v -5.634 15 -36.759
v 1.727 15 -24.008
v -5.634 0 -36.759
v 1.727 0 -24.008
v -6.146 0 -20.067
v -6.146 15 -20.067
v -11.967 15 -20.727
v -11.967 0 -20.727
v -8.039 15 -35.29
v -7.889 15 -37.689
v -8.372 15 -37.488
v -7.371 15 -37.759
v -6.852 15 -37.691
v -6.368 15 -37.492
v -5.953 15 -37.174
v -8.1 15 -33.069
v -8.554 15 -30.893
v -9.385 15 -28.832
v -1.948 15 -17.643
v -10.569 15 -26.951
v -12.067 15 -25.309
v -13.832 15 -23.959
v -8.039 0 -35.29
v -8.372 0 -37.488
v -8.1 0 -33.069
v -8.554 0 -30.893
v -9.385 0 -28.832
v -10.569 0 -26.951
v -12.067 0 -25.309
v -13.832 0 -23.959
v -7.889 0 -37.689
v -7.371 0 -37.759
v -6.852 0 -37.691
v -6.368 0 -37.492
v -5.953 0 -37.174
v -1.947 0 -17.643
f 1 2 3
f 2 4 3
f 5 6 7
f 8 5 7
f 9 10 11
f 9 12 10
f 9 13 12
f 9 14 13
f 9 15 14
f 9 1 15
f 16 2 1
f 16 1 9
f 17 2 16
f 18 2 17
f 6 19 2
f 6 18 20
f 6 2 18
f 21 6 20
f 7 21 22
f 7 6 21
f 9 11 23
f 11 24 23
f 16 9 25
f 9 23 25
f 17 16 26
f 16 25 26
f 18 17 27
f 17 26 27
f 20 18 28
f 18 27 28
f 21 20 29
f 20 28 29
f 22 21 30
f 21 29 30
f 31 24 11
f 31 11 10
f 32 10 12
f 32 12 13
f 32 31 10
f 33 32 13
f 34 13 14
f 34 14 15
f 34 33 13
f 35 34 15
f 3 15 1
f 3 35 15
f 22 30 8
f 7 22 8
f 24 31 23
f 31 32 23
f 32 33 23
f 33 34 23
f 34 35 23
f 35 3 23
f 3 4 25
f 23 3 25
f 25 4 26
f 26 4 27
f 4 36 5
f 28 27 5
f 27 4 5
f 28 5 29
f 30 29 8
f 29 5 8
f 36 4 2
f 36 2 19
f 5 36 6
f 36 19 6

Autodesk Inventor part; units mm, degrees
ref_plane "YZ Plane" through (0, 0, 0) normal (1, 0, 0) x (0, 1, 0)
ref_plane "XZ Plane" through (0, 0, 0) normal (0, 1, 0) x (-1, 0, 0)
ref_plane "XY Plane" through (0, 0, 0) normal (0, 0, 1) x (1, 0, 0)
sketch "スケッチ2" plane through (0, 0, 0) normal (0, 1, 0) x (-1, 0, 0)
  line L0 (0, 0) -> (-8.6603, -15)
  line L1 (-8.6603, -15) -> (11.3397, -49.641)
  line L2 (73.7428, 0) -> (-22.3941, 0) projected
  line L3 (11.3397, -49.641) -> (5.9252, -52.7671) construction
  line L4 (0, 0) -> (-6.6711, 3.8516) construction
  line L5 (11.3397, -49.641) -> (24.3301, -42.141)
  line L6 (24.3301, -42.141) -> (0, 0)
  line L7 (0, 0) -> (8.2272, -4.75)
  line L8 (8.2272, -4.75) -> (-3.1754, -24.5)
  line L9 (-2.5935, -25.5079) -> (9.1002, -5.254)
  line L10 (9.1002, -5.254) -> (8.2272, -4.75)
  line L11 (-3.1754, -24.5) -> (2.5403, -27.8)
  line L12 (2.5403, -27.8) -> (12.2903, -10.9125)
  line L13 (12.2903, -10.9125) -> (6.5746, -7.6125)
  line L14 (6.5746, -7.6125) -> (-3.1754, -24.5)
  line L15 (11.3397, -49.641) -> (31.9282, -37.7543)
  line L16 (31.9282, -37.7543) -> (38.6416, -26.1264)
  line L17 (6.3397, -40.9808) -> (21.9282, -31.9808) construction
  line L18 (21.9282, -31.9808) -> (31.9282, -37.7543)
  line L19 (12.2903, -10.9125) -> (38.6416, -26.1264)
  line L20 (38.6416, -26.1264) -> (3.5066, -26.1264)
  line L21 (0, 0) -> (21.3397, 36.9615)
  line L22 (21.3397, 36.9615) -> (15.2136, 40.4985)
  line L23 (-0.5996, -1.0385) -> (60.009, -1.0385)
  circle A0 centre (21.3397, -13.5385) radius 12.5 construction
  circle A1 centre (21.3397, -13.5385) radius 10.5 construction
  circle A2 centre (20.5151, -34.5223) radius 10.5 construction
  circle A3 centre (20.5151, -34.5223) radius 11.5 construction
  circle A4 centre (20.5151, -34.5223) radius 12.5
  line L24 (8.3719, -37.4876) -> (11.3397, -49.641)
  line L25 (-2.3094, -23) -> (12.6388, -48.891)
  point P0 (9.2953, -16.1)
  point P1 (7.4475, -8.1165)
  point P2 (-2.3025, -25.004)
  point P3 (15.0841, -26.1264)
  point P4 (11.2545, -26.1264)
  point P5 (6.0668, -10.5079)
  point P6 (13.8325, -23.9586)
  point P7 (10.0702, -44.4421)
  point P8 (-1.7275, -24.0079)
  dimension "d34" = 25
  dimension "d11" = 60
  dimension "d12" = 60
  dimension "d13" = 40
  dimension "d15" = 15
  dimension "d16" = 9.5
  dimension "d17" = 1.0079
  dimension "d18" = 19.5
  dimension "d19" = 6.6
  dimension "d24" = 18
  dimension "d25" = 30
  dimension "d26" = 60
  dimension "d28" = 60
  dimension "d29" = 38
  dimension "d30" = 25
  dimension "d31" = 21
  dimension "d32" = 21
  dimension "d33" = 23
  dimension "d40" = 1.5
extrude "押し出し4" add sketch "スケッチ2" along normal blind 15 contours L6 L12 L11 L25 L9 | L6 A4 L20 L12 | L11 L12 L20 A4 L24 L25
fillet "フィレット1" radius 2 1 edges at (-10.0702, 7.5, -44.4421)
sketch "スケッチ3" plane through (0, 15, 0) normal (0, 1, 0) x (1, 0, 0)
  ellipse E0 centre (-16.5607, 22.817) end of major axis (-18.0607, 20.2189) minor radius 2.9999 (-18.4056, 20.4514) -> (-17.74, 20.0585) ccw projected
  ellipse E1 centre (-20.6882, 13.1623) end of major axis (-16.9382, 19.6575) minor radius 7.4997 (-13.3193, 14.5576) -> (-17.74, 20.0585) ccw projected
  line L0 (-13.3193, 14.5576) -> (-11.4591, 4.7323) projected
  line L1 (-11.4591, 4.7323) -> (-7.1359, 7.9366) projected
  line L2 (-7.1359, 7.9366) -> (-2.1359, 16.5968) projected
  line L3 (-2.1359, 16.5968) -> (-6.4659, 19.0967) projected
  line L4 (-6.4659, 19.0967) -> (-18.4056, 20.4514) projected
  line L5 (-6.0668, 10.5079) -> (1.7275, 24.0079) projected
  line L6 (-1.9475, 17.6428) -> (-6.1462, 20.0669)
  line L7 (-6.1462, 20.0669) -> (-11.9669, 20.7273)
  line L8 (-13.8325, 23.9586) -> (-6.0668, 10.5079) projected
  point P0 (0, 0)
  point P1 (2.5935, 25.5079)
  dimension "d36" = 1
  dimension "d37" = 1
extrude "押し出し5" cut sketch "スケッチ3" against normal through all contours L8 L7 L6 L5 L3 L4 | L4 L3 L5 L8
equation "\"d37\" = d36"
properties part number "base_backwall_setter_under"
